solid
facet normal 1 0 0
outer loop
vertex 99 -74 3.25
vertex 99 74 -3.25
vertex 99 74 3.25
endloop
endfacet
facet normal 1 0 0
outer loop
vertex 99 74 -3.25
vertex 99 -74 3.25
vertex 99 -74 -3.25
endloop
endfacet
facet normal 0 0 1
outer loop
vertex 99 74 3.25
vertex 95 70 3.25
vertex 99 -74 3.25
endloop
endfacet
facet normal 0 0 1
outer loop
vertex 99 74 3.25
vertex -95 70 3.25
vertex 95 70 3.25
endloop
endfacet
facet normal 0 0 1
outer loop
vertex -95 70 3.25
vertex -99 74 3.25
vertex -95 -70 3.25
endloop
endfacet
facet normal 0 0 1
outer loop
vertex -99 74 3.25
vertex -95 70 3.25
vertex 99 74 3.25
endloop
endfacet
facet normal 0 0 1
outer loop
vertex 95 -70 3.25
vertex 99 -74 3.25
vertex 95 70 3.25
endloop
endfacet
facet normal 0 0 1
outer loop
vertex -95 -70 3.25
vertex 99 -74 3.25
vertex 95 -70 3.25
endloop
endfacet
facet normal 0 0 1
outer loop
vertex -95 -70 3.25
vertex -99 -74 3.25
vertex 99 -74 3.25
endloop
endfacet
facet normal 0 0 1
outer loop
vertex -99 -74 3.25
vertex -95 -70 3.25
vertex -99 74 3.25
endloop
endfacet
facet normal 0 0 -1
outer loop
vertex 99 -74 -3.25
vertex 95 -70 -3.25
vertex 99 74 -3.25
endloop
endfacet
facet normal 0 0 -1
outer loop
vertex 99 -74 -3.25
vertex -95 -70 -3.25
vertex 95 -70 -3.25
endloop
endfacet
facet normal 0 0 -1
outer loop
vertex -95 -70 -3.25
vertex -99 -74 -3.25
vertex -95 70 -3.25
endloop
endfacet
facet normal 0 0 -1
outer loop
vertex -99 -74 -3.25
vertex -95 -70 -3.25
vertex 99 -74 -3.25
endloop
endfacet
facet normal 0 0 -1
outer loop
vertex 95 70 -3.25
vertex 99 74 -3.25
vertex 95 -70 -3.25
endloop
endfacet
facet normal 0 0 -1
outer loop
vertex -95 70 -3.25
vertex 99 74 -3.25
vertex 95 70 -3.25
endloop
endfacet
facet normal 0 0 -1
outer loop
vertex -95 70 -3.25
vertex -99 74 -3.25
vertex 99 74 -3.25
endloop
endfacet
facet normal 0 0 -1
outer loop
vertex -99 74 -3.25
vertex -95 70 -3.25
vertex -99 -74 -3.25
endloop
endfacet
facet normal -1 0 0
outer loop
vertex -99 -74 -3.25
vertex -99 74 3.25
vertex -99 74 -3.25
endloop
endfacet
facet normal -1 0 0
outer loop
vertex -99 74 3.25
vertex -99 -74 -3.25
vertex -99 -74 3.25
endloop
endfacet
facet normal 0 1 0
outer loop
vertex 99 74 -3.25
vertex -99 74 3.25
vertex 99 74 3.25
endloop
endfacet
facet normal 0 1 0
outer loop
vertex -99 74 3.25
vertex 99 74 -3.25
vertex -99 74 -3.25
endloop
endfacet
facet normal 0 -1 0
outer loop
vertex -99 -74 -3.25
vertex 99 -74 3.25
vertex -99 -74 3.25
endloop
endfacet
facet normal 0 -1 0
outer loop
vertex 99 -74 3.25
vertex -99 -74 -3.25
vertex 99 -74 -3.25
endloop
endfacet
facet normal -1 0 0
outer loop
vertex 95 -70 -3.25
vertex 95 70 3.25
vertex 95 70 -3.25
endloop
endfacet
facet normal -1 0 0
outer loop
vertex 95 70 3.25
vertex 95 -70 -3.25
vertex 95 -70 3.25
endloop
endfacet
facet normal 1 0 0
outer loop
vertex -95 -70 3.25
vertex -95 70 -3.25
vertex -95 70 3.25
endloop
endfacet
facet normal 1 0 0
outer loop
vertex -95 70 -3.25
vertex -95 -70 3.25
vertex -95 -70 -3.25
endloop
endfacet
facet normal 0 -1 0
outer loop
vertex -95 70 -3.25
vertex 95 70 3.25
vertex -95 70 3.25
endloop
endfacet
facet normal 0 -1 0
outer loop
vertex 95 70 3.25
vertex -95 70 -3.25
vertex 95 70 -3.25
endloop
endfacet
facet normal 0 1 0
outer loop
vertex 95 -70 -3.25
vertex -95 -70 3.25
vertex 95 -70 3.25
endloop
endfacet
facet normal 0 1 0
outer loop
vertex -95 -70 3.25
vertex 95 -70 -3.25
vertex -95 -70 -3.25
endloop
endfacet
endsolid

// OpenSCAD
difference()
{
	cube([198,148,6.5], center=true);
	cube([190,140,6.5], center=true);
}
